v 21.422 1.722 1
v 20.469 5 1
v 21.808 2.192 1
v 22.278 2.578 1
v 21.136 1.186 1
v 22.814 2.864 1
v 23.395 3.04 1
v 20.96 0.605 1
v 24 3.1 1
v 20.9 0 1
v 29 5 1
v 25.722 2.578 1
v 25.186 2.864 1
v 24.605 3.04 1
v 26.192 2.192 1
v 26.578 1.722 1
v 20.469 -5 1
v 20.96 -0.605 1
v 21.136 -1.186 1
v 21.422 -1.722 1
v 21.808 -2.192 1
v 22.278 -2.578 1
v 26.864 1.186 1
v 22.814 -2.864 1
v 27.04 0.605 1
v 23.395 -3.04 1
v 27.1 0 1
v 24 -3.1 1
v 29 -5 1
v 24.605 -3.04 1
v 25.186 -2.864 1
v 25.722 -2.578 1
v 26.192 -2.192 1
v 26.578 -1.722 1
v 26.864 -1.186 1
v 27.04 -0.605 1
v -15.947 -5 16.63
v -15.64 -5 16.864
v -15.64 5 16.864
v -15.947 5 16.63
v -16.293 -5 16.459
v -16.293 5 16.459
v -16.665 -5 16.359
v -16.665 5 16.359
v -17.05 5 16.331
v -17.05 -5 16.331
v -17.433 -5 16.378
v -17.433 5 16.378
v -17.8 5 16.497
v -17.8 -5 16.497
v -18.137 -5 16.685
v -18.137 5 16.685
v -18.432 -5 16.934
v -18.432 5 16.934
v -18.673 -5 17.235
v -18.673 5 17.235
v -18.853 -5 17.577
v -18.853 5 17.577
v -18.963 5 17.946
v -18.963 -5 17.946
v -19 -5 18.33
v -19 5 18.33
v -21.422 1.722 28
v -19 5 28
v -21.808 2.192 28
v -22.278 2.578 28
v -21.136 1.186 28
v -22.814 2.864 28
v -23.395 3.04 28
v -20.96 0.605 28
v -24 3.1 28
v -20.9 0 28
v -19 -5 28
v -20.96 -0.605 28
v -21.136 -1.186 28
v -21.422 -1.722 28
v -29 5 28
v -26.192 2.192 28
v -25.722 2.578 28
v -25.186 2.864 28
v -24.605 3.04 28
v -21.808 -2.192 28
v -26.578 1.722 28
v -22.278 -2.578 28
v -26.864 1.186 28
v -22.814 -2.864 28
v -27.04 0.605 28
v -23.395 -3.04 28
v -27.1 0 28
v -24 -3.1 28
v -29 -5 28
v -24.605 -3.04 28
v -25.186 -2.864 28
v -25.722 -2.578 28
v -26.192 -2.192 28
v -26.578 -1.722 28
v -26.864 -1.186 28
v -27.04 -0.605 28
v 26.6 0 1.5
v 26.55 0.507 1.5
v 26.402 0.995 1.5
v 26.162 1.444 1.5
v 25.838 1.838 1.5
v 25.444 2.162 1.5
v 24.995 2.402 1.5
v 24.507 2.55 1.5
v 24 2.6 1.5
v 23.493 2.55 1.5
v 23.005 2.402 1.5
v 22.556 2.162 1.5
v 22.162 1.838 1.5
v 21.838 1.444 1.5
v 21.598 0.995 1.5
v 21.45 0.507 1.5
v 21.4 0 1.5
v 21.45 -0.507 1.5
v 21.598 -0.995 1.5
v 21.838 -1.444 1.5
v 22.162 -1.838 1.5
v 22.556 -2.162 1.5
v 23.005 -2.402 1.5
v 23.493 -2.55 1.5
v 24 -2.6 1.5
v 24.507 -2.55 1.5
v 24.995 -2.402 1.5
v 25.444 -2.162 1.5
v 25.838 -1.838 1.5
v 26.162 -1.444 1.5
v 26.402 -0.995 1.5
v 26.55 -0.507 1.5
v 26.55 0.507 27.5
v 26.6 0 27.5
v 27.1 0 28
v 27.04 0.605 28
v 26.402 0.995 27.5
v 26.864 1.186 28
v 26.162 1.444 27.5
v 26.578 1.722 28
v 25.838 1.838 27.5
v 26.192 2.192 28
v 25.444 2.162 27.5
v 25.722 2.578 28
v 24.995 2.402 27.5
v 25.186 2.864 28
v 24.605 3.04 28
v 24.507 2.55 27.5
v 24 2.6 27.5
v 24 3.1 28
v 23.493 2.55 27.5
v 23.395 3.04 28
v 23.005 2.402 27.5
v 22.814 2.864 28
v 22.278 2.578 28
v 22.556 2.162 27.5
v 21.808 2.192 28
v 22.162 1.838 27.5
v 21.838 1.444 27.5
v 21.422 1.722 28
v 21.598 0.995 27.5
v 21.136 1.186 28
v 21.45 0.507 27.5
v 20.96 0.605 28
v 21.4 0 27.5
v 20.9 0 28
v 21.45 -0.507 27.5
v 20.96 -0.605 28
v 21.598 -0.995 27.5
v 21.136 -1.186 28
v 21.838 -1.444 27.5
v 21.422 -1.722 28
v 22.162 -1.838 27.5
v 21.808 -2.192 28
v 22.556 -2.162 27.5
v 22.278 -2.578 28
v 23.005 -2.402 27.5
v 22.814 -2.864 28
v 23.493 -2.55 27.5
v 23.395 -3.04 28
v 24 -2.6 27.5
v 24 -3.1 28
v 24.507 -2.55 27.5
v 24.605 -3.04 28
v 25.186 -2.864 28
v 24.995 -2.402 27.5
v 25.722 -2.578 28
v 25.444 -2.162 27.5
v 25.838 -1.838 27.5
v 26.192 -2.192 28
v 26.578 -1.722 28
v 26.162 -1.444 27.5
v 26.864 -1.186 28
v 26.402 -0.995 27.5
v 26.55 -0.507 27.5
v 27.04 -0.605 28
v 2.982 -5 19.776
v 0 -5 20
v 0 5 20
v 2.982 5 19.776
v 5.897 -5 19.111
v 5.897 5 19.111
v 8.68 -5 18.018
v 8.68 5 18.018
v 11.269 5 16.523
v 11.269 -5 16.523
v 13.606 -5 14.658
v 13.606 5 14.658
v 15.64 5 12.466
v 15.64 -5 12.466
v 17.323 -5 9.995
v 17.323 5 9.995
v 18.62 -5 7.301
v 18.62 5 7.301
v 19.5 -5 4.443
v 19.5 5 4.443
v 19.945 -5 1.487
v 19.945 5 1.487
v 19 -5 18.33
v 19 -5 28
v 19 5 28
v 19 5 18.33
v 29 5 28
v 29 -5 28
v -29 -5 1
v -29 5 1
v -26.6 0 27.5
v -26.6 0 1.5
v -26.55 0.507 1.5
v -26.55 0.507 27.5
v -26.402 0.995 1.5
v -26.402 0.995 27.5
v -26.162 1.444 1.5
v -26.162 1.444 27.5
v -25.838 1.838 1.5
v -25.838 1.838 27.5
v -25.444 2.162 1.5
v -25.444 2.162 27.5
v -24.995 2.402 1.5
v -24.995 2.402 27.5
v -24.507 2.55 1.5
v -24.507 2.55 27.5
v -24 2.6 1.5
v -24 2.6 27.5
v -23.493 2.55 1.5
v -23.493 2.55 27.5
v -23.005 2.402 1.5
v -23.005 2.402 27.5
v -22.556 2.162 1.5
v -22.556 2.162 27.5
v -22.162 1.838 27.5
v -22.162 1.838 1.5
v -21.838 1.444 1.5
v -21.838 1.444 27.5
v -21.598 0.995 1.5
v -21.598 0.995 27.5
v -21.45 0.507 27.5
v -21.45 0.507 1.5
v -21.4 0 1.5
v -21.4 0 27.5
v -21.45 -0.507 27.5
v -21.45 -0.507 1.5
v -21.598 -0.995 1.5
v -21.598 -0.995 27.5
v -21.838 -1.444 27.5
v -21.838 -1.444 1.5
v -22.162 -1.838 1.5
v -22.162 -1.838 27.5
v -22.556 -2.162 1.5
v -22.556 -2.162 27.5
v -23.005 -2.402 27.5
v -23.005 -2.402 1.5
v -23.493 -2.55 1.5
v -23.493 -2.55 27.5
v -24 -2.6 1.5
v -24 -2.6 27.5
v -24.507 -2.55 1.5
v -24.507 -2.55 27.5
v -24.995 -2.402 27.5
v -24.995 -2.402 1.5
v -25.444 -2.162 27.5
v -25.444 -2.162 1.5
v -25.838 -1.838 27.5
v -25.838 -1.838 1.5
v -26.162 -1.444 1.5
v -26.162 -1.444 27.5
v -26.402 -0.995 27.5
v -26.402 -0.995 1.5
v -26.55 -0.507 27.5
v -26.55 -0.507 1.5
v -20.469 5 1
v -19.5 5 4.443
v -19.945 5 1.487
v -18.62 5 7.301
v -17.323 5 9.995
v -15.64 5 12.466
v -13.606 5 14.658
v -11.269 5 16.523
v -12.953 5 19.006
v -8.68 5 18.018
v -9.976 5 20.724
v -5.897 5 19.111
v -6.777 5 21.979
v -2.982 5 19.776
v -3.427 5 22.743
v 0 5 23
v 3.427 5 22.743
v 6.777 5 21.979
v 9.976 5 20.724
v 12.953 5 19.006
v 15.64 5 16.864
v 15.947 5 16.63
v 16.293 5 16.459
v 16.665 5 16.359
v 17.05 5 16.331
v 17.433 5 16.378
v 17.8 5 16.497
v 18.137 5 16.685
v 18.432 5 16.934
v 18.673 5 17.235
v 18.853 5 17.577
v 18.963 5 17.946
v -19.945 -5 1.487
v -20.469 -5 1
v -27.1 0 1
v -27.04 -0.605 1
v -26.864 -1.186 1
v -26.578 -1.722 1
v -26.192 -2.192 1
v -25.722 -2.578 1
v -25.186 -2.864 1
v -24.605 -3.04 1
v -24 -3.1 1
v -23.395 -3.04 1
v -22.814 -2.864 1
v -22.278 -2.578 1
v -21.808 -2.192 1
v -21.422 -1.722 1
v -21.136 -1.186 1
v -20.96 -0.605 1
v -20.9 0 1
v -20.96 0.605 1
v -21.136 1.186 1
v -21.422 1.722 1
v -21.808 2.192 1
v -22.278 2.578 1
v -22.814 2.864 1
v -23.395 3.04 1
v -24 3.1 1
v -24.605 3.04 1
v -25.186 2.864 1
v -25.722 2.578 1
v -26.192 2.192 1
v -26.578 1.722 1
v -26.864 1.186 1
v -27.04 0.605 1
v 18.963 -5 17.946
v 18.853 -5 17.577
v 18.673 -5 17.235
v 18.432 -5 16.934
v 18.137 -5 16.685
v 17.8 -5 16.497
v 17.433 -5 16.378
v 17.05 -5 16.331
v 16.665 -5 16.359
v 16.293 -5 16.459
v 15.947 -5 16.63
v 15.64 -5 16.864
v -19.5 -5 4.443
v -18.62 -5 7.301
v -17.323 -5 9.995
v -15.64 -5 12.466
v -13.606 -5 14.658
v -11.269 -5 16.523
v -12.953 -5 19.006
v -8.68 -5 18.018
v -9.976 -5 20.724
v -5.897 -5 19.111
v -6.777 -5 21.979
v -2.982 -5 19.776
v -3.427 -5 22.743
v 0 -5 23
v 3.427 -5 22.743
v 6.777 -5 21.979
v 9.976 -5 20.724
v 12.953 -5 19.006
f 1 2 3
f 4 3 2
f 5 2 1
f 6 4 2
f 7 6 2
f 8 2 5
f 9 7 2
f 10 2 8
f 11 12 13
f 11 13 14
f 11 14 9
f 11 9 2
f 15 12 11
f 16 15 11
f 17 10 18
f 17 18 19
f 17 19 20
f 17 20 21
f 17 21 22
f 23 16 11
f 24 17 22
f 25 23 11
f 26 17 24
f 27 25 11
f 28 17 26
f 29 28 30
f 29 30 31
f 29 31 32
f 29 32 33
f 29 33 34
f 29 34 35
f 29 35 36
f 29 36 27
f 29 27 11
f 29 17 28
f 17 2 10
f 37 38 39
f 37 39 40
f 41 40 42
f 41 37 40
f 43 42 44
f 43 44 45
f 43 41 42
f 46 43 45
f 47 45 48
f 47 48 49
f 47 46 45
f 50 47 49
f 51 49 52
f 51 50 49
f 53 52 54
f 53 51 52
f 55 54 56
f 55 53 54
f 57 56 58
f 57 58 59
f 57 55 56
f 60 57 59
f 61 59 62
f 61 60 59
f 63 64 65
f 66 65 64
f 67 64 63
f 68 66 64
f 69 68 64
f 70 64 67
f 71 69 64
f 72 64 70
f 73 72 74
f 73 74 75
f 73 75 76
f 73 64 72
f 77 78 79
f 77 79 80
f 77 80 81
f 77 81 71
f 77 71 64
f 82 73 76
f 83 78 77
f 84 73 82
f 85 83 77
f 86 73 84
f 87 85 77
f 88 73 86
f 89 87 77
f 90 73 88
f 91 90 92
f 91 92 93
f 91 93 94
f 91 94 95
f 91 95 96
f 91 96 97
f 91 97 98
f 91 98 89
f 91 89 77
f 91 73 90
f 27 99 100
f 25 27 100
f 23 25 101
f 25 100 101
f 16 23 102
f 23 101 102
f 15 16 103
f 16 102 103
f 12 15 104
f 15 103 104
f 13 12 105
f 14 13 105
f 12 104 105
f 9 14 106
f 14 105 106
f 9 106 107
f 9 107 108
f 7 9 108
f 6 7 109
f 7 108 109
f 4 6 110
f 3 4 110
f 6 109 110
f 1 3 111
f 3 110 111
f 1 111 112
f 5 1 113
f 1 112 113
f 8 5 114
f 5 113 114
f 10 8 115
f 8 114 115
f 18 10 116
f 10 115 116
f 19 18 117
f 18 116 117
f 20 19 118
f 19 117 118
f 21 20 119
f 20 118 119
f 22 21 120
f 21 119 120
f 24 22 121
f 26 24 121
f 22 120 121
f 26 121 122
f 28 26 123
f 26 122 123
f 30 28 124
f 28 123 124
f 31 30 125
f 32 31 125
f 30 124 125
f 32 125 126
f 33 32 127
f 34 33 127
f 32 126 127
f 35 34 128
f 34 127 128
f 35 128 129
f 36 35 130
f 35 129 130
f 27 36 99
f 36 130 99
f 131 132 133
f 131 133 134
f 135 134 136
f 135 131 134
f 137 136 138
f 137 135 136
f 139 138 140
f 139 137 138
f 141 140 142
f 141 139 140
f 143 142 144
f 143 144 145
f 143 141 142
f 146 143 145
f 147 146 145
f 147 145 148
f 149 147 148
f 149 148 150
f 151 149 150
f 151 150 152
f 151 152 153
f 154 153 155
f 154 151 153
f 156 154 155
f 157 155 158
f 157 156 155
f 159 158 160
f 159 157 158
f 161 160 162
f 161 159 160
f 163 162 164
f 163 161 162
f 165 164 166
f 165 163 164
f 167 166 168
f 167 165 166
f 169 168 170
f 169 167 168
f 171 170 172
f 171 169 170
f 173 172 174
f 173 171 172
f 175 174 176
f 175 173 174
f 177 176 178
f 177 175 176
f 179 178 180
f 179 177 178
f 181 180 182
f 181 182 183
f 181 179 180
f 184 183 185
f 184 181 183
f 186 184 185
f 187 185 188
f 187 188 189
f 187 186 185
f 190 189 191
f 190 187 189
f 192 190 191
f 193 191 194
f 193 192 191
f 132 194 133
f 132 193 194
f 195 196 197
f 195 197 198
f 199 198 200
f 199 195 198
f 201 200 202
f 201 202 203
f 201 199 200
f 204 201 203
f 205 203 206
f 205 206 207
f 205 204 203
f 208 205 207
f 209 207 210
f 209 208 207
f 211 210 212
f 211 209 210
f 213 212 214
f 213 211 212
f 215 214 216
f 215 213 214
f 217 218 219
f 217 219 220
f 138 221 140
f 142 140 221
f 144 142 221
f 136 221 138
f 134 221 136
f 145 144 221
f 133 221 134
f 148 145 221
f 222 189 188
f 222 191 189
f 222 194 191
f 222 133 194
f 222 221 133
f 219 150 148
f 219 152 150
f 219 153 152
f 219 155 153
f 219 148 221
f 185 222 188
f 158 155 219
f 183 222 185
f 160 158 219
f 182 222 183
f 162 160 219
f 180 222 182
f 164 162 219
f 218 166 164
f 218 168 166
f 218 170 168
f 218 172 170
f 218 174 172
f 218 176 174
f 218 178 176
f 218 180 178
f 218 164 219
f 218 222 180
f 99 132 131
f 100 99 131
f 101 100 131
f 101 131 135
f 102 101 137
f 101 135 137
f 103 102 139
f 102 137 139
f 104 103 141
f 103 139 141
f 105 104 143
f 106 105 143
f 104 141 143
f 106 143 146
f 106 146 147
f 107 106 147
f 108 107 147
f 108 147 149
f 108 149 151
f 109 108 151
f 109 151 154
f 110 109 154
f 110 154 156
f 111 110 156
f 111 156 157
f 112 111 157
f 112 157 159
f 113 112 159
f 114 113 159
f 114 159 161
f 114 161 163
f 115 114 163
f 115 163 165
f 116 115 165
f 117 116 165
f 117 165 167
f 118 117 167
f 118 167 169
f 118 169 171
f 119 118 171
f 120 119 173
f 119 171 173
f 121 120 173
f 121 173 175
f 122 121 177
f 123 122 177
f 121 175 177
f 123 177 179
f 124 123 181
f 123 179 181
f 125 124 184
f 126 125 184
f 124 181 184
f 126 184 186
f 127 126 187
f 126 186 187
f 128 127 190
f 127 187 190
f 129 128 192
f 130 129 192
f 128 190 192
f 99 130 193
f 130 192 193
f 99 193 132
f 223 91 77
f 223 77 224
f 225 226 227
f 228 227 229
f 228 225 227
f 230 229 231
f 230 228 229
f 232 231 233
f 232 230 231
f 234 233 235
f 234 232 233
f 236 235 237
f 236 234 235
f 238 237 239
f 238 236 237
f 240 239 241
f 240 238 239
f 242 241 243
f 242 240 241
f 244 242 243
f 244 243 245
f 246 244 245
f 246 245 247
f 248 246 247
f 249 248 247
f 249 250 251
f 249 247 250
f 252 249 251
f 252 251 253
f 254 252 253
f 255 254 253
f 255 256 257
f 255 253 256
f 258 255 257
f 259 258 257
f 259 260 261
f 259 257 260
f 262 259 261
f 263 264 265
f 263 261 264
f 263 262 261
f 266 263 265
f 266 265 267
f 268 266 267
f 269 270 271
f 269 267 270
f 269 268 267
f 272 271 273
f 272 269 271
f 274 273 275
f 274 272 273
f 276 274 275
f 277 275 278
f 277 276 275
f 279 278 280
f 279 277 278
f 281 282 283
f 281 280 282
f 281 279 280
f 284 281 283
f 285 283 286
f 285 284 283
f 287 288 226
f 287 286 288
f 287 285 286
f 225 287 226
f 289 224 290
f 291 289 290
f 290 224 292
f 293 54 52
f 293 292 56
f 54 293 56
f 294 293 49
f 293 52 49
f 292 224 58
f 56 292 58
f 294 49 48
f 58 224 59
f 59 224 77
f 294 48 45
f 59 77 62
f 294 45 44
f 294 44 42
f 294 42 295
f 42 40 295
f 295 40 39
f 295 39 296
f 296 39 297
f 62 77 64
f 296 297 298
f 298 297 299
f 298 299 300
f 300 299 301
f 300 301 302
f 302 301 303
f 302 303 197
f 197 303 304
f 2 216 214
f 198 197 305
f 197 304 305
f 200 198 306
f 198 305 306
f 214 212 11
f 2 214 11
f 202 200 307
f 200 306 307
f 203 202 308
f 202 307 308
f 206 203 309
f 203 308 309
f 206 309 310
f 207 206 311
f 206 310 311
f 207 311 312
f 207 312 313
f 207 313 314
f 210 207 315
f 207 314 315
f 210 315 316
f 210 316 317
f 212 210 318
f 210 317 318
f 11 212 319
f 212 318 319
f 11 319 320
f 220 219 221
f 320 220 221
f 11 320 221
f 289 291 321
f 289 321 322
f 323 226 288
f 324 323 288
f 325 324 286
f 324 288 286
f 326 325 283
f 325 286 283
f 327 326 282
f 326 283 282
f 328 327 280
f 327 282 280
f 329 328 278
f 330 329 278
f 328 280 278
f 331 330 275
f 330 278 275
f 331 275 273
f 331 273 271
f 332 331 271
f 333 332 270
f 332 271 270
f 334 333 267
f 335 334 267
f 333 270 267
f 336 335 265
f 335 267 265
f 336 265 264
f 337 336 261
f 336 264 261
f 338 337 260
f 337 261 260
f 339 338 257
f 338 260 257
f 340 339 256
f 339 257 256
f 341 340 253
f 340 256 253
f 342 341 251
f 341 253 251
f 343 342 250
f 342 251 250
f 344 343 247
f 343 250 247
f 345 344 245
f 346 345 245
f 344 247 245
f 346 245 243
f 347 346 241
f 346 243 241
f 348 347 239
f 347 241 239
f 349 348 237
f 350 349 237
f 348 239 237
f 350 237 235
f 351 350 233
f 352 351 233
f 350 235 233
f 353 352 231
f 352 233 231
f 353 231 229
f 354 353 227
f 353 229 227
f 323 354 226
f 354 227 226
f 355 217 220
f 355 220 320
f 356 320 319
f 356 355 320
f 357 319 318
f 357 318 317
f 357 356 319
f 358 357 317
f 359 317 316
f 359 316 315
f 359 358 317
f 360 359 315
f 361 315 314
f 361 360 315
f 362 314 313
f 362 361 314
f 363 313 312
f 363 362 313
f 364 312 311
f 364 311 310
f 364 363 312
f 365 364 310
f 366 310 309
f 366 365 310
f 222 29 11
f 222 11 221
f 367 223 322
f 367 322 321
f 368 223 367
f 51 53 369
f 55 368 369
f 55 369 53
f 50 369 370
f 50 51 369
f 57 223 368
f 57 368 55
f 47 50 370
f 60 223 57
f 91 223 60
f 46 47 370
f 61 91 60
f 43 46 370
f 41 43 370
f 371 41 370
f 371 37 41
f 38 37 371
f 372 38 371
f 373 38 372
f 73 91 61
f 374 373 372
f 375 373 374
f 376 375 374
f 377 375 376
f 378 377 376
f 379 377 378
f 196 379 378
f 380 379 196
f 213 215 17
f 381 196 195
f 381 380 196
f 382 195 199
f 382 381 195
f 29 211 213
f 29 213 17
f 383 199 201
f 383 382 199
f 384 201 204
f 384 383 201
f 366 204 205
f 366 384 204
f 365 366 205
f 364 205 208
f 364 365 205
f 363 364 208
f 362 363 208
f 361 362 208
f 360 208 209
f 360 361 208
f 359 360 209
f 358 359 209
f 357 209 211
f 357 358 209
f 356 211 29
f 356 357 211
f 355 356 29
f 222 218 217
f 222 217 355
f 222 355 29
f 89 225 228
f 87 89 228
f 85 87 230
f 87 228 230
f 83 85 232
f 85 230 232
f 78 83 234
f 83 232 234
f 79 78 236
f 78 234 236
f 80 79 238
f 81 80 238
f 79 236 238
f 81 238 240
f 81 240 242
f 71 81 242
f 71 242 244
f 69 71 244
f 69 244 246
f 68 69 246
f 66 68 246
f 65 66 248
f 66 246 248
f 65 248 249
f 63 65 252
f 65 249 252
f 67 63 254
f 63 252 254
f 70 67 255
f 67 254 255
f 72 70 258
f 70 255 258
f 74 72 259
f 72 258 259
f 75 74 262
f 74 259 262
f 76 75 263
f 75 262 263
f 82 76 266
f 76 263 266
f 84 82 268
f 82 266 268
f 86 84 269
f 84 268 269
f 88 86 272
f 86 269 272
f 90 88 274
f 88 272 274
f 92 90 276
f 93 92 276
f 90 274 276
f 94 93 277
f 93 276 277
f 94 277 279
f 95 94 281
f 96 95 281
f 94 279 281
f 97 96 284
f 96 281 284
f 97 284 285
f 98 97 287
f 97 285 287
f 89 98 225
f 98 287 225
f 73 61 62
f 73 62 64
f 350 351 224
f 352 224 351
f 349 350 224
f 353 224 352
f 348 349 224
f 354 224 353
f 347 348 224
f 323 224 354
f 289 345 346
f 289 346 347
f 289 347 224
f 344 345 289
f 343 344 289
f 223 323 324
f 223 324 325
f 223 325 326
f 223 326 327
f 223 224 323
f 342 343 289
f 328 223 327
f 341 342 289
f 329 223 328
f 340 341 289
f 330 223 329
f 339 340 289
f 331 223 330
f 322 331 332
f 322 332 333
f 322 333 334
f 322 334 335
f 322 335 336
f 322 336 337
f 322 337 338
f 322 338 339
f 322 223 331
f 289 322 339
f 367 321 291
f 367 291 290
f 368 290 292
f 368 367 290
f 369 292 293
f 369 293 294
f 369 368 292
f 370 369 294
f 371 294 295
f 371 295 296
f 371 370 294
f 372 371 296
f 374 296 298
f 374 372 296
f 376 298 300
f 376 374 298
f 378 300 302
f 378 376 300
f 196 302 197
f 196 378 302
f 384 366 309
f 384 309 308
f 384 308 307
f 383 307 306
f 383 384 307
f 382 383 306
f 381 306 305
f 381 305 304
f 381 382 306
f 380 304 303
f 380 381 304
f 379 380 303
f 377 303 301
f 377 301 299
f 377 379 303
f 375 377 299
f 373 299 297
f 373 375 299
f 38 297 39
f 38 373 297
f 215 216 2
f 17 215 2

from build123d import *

# Parameters (mm, degrees)
F1_DEPTH    = 5
F2_T1_DEPTH = 6.2718359258
F2_T3_DEPTH = 6.2718359258
F3_R        = 2.6
F4_DEPTH    = 27.001
F5_SIZE     = 0.5


# Not quite as in the source:
# - a fillet or chamfer that OpenCascade refuses, or shapes differently, is made with other operations: its cross-section is extruded or revolved along the edge and cut away or added
# - a pattern or mirror of a feature is missing from the dataset's text; its kind, count and spacing are read off the source's solid


with BuildPart() as f1:
    # F0 (on Front) → F1 (new body, symmetric)
    with BuildSketch(Plane.XZ):
        with BuildLine():
            ThreePointArc((0, 20), (13.7840487521, 14.4913767462), (19.9749843554, 1))
            Line((19.9749843554, 1), (29, 1))
            Line((29, 1), (29, 28))
            Line((29, 28), (19, 28))
            Line((19, 28), (19, 18.3303027798))
            ThreePointArc((19, 18.3303027798), (17.8, 16.4972725018), (15.64, 16.8638785574))
            ThreePointArc((15.64, 16.8638785574), (8.4003212194, 21.4110859933), (0, 23))
            ThreePointArc((0, 23), (-8.4003212194, 21.4110859933), (-15.64, 16.8638785574))
            ThreePointArc((-15.64, 16.8638785574), (-17.8, 16.4972725018), (-19, 18.3303027798))
            Line((-19, 18.3303027798), (-19, 28))
            Line((-19, 28), (-29, 28))
            Line((-29, 28), (-29, 1))
            Line((-29, 1), (-19.9749843554, 1))
            ThreePointArc((-19.9749843554, 1), (-13.7840487521, 14.4913767462), (0, 20))
        make_face()
    extrude(amount=F1_DEPTH, both=True)

    # F2: chamfer of 0.5 on 4 edges, made by hand

    # F2_s2 → F2_t1 (cut)
    with BuildSketch(Plane.XZ.offset(-6.2718359258)):
        with BuildLine():
            Line((19.9300167465, 1.500192138), (20.4835367376, 0.9863935992))
            Line((20.4835367376, 0.9863935992), (20.4835367376, 0.9763935992))
            ThreePointArc((20.4835367376, 0.9763935992), (20.2292605465, 0.99), (19.9749843554, 0.99))
            Line((19.9749843554, 0.99), (19.9649968633, 0.9995))
            ThreePointArc((19.9649968633, 0.9995), (19.9508800221, 1.249994537), (19.920044409, 1.4994488451))
            Line((19.920044409, 1.4994488451), (19.9300167465, 1.500192138))
        make_face()
        with BuildLine():
            Line((-19.9300167465, 1.500192138), (-20.4835367376, 0.9863935992))
            Line((-20.4835367376, 0.9863935992), (-20.4835367376, 0.9763935992))
            ThreePointArc((-20.4835367376, 0.9763935992), (-20.2292605465, 0.99), (-19.9749843554, 0.99))
            Line((-19.9749843554, 0.99), (-19.9649968633, 0.9995))
            ThreePointArc((-19.9649968633, 0.9995), (-19.9508800221, 1.249994537), (-19.920044409, 1.4994488451))
            Line((-19.920044409, 1.4994488451), (-19.9300167465, 1.500192138))
        make_face()
    extrude(amount=F2_T1_DEPTH, mode=Mode.SUBTRACT)

    # F2_s4 → F2_t3 (cut)
    with BuildSketch(Plane.XZ):
        with BuildLine():
            Line((19.9300167465, 1.500192138), (20.4835367376, 0.9863935992))
            Line((20.4835367376, 0.9863935992), (20.4835367376, 0.9763935992))
            ThreePointArc((20.4835367376, 0.9763935992), (20.2292605465, 0.99), (19.9749843554, 0.99))
            Line((19.9749843554, 0.99), (19.9649968633, 0.9995))
            ThreePointArc((19.9649968633, 0.9995), (19.9508800221, 1.249994537), (19.920044409, 1.4994488451))
            Line((19.920044409, 1.4994488451), (19.9300167465, 1.500192138))
        make_face()
        with BuildLine():
            Line((-19.9300167465, 1.500192138), (-20.4835367376, 0.9863935992))
            Line((-20.4835367376, 0.9863935992), (-20.4835367376, 0.9763935992))
            ThreePointArc((-20.4835367376, 0.9763935992), (-20.2292605465, 0.99), (-19.9749843554, 0.99))
            Line((-19.9749843554, 0.99), (-19.9649968633, 0.9995))
            ThreePointArc((-19.9649968633, 0.9995), (-19.9508800221, 1.249994537), (-19.920044409, 1.4994488451))
            Line((-19.920044409, 1.4994488451), (-19.9300167465, 1.500192138))
        make_face()
    extrude(amount=F2_T3_DEPTH, mode=Mode.SUBTRACT)

    # F3 (on face) → F4 (cut, through all)
    with BuildSketch(Plane.XY.offset(28)):
        with Locations((24, 0)):
            Circle(F3_R)
    f4 = extrude(amount=-F4_DEPTH, mode=Mode.SUBTRACT)

    # F4_copies: F4 across plane
    add(f4.mirror(Plane(origin=(0, 0, 0), x_dir=(0, 0, -1), z_dir=(-1, 0, 0))), mode=Mode.SUBTRACT)

    # F5
    f5_edges = [f1.edges().sort_by_distance(p)[0] for p in [
        (24, 2.6, 28),
        (24, -2.6, 28),
        (24, 2.6, 1),
        (-24, 2.6, 1),
        (-24, 2.6, 28),
        (24, -2.6, 1),
        (-24, -2.6, 1),
        (-24, -2.6, 28),
    ]]
    chamfer(f5_edges, length=F5_SIZE)


solid = f1.part
